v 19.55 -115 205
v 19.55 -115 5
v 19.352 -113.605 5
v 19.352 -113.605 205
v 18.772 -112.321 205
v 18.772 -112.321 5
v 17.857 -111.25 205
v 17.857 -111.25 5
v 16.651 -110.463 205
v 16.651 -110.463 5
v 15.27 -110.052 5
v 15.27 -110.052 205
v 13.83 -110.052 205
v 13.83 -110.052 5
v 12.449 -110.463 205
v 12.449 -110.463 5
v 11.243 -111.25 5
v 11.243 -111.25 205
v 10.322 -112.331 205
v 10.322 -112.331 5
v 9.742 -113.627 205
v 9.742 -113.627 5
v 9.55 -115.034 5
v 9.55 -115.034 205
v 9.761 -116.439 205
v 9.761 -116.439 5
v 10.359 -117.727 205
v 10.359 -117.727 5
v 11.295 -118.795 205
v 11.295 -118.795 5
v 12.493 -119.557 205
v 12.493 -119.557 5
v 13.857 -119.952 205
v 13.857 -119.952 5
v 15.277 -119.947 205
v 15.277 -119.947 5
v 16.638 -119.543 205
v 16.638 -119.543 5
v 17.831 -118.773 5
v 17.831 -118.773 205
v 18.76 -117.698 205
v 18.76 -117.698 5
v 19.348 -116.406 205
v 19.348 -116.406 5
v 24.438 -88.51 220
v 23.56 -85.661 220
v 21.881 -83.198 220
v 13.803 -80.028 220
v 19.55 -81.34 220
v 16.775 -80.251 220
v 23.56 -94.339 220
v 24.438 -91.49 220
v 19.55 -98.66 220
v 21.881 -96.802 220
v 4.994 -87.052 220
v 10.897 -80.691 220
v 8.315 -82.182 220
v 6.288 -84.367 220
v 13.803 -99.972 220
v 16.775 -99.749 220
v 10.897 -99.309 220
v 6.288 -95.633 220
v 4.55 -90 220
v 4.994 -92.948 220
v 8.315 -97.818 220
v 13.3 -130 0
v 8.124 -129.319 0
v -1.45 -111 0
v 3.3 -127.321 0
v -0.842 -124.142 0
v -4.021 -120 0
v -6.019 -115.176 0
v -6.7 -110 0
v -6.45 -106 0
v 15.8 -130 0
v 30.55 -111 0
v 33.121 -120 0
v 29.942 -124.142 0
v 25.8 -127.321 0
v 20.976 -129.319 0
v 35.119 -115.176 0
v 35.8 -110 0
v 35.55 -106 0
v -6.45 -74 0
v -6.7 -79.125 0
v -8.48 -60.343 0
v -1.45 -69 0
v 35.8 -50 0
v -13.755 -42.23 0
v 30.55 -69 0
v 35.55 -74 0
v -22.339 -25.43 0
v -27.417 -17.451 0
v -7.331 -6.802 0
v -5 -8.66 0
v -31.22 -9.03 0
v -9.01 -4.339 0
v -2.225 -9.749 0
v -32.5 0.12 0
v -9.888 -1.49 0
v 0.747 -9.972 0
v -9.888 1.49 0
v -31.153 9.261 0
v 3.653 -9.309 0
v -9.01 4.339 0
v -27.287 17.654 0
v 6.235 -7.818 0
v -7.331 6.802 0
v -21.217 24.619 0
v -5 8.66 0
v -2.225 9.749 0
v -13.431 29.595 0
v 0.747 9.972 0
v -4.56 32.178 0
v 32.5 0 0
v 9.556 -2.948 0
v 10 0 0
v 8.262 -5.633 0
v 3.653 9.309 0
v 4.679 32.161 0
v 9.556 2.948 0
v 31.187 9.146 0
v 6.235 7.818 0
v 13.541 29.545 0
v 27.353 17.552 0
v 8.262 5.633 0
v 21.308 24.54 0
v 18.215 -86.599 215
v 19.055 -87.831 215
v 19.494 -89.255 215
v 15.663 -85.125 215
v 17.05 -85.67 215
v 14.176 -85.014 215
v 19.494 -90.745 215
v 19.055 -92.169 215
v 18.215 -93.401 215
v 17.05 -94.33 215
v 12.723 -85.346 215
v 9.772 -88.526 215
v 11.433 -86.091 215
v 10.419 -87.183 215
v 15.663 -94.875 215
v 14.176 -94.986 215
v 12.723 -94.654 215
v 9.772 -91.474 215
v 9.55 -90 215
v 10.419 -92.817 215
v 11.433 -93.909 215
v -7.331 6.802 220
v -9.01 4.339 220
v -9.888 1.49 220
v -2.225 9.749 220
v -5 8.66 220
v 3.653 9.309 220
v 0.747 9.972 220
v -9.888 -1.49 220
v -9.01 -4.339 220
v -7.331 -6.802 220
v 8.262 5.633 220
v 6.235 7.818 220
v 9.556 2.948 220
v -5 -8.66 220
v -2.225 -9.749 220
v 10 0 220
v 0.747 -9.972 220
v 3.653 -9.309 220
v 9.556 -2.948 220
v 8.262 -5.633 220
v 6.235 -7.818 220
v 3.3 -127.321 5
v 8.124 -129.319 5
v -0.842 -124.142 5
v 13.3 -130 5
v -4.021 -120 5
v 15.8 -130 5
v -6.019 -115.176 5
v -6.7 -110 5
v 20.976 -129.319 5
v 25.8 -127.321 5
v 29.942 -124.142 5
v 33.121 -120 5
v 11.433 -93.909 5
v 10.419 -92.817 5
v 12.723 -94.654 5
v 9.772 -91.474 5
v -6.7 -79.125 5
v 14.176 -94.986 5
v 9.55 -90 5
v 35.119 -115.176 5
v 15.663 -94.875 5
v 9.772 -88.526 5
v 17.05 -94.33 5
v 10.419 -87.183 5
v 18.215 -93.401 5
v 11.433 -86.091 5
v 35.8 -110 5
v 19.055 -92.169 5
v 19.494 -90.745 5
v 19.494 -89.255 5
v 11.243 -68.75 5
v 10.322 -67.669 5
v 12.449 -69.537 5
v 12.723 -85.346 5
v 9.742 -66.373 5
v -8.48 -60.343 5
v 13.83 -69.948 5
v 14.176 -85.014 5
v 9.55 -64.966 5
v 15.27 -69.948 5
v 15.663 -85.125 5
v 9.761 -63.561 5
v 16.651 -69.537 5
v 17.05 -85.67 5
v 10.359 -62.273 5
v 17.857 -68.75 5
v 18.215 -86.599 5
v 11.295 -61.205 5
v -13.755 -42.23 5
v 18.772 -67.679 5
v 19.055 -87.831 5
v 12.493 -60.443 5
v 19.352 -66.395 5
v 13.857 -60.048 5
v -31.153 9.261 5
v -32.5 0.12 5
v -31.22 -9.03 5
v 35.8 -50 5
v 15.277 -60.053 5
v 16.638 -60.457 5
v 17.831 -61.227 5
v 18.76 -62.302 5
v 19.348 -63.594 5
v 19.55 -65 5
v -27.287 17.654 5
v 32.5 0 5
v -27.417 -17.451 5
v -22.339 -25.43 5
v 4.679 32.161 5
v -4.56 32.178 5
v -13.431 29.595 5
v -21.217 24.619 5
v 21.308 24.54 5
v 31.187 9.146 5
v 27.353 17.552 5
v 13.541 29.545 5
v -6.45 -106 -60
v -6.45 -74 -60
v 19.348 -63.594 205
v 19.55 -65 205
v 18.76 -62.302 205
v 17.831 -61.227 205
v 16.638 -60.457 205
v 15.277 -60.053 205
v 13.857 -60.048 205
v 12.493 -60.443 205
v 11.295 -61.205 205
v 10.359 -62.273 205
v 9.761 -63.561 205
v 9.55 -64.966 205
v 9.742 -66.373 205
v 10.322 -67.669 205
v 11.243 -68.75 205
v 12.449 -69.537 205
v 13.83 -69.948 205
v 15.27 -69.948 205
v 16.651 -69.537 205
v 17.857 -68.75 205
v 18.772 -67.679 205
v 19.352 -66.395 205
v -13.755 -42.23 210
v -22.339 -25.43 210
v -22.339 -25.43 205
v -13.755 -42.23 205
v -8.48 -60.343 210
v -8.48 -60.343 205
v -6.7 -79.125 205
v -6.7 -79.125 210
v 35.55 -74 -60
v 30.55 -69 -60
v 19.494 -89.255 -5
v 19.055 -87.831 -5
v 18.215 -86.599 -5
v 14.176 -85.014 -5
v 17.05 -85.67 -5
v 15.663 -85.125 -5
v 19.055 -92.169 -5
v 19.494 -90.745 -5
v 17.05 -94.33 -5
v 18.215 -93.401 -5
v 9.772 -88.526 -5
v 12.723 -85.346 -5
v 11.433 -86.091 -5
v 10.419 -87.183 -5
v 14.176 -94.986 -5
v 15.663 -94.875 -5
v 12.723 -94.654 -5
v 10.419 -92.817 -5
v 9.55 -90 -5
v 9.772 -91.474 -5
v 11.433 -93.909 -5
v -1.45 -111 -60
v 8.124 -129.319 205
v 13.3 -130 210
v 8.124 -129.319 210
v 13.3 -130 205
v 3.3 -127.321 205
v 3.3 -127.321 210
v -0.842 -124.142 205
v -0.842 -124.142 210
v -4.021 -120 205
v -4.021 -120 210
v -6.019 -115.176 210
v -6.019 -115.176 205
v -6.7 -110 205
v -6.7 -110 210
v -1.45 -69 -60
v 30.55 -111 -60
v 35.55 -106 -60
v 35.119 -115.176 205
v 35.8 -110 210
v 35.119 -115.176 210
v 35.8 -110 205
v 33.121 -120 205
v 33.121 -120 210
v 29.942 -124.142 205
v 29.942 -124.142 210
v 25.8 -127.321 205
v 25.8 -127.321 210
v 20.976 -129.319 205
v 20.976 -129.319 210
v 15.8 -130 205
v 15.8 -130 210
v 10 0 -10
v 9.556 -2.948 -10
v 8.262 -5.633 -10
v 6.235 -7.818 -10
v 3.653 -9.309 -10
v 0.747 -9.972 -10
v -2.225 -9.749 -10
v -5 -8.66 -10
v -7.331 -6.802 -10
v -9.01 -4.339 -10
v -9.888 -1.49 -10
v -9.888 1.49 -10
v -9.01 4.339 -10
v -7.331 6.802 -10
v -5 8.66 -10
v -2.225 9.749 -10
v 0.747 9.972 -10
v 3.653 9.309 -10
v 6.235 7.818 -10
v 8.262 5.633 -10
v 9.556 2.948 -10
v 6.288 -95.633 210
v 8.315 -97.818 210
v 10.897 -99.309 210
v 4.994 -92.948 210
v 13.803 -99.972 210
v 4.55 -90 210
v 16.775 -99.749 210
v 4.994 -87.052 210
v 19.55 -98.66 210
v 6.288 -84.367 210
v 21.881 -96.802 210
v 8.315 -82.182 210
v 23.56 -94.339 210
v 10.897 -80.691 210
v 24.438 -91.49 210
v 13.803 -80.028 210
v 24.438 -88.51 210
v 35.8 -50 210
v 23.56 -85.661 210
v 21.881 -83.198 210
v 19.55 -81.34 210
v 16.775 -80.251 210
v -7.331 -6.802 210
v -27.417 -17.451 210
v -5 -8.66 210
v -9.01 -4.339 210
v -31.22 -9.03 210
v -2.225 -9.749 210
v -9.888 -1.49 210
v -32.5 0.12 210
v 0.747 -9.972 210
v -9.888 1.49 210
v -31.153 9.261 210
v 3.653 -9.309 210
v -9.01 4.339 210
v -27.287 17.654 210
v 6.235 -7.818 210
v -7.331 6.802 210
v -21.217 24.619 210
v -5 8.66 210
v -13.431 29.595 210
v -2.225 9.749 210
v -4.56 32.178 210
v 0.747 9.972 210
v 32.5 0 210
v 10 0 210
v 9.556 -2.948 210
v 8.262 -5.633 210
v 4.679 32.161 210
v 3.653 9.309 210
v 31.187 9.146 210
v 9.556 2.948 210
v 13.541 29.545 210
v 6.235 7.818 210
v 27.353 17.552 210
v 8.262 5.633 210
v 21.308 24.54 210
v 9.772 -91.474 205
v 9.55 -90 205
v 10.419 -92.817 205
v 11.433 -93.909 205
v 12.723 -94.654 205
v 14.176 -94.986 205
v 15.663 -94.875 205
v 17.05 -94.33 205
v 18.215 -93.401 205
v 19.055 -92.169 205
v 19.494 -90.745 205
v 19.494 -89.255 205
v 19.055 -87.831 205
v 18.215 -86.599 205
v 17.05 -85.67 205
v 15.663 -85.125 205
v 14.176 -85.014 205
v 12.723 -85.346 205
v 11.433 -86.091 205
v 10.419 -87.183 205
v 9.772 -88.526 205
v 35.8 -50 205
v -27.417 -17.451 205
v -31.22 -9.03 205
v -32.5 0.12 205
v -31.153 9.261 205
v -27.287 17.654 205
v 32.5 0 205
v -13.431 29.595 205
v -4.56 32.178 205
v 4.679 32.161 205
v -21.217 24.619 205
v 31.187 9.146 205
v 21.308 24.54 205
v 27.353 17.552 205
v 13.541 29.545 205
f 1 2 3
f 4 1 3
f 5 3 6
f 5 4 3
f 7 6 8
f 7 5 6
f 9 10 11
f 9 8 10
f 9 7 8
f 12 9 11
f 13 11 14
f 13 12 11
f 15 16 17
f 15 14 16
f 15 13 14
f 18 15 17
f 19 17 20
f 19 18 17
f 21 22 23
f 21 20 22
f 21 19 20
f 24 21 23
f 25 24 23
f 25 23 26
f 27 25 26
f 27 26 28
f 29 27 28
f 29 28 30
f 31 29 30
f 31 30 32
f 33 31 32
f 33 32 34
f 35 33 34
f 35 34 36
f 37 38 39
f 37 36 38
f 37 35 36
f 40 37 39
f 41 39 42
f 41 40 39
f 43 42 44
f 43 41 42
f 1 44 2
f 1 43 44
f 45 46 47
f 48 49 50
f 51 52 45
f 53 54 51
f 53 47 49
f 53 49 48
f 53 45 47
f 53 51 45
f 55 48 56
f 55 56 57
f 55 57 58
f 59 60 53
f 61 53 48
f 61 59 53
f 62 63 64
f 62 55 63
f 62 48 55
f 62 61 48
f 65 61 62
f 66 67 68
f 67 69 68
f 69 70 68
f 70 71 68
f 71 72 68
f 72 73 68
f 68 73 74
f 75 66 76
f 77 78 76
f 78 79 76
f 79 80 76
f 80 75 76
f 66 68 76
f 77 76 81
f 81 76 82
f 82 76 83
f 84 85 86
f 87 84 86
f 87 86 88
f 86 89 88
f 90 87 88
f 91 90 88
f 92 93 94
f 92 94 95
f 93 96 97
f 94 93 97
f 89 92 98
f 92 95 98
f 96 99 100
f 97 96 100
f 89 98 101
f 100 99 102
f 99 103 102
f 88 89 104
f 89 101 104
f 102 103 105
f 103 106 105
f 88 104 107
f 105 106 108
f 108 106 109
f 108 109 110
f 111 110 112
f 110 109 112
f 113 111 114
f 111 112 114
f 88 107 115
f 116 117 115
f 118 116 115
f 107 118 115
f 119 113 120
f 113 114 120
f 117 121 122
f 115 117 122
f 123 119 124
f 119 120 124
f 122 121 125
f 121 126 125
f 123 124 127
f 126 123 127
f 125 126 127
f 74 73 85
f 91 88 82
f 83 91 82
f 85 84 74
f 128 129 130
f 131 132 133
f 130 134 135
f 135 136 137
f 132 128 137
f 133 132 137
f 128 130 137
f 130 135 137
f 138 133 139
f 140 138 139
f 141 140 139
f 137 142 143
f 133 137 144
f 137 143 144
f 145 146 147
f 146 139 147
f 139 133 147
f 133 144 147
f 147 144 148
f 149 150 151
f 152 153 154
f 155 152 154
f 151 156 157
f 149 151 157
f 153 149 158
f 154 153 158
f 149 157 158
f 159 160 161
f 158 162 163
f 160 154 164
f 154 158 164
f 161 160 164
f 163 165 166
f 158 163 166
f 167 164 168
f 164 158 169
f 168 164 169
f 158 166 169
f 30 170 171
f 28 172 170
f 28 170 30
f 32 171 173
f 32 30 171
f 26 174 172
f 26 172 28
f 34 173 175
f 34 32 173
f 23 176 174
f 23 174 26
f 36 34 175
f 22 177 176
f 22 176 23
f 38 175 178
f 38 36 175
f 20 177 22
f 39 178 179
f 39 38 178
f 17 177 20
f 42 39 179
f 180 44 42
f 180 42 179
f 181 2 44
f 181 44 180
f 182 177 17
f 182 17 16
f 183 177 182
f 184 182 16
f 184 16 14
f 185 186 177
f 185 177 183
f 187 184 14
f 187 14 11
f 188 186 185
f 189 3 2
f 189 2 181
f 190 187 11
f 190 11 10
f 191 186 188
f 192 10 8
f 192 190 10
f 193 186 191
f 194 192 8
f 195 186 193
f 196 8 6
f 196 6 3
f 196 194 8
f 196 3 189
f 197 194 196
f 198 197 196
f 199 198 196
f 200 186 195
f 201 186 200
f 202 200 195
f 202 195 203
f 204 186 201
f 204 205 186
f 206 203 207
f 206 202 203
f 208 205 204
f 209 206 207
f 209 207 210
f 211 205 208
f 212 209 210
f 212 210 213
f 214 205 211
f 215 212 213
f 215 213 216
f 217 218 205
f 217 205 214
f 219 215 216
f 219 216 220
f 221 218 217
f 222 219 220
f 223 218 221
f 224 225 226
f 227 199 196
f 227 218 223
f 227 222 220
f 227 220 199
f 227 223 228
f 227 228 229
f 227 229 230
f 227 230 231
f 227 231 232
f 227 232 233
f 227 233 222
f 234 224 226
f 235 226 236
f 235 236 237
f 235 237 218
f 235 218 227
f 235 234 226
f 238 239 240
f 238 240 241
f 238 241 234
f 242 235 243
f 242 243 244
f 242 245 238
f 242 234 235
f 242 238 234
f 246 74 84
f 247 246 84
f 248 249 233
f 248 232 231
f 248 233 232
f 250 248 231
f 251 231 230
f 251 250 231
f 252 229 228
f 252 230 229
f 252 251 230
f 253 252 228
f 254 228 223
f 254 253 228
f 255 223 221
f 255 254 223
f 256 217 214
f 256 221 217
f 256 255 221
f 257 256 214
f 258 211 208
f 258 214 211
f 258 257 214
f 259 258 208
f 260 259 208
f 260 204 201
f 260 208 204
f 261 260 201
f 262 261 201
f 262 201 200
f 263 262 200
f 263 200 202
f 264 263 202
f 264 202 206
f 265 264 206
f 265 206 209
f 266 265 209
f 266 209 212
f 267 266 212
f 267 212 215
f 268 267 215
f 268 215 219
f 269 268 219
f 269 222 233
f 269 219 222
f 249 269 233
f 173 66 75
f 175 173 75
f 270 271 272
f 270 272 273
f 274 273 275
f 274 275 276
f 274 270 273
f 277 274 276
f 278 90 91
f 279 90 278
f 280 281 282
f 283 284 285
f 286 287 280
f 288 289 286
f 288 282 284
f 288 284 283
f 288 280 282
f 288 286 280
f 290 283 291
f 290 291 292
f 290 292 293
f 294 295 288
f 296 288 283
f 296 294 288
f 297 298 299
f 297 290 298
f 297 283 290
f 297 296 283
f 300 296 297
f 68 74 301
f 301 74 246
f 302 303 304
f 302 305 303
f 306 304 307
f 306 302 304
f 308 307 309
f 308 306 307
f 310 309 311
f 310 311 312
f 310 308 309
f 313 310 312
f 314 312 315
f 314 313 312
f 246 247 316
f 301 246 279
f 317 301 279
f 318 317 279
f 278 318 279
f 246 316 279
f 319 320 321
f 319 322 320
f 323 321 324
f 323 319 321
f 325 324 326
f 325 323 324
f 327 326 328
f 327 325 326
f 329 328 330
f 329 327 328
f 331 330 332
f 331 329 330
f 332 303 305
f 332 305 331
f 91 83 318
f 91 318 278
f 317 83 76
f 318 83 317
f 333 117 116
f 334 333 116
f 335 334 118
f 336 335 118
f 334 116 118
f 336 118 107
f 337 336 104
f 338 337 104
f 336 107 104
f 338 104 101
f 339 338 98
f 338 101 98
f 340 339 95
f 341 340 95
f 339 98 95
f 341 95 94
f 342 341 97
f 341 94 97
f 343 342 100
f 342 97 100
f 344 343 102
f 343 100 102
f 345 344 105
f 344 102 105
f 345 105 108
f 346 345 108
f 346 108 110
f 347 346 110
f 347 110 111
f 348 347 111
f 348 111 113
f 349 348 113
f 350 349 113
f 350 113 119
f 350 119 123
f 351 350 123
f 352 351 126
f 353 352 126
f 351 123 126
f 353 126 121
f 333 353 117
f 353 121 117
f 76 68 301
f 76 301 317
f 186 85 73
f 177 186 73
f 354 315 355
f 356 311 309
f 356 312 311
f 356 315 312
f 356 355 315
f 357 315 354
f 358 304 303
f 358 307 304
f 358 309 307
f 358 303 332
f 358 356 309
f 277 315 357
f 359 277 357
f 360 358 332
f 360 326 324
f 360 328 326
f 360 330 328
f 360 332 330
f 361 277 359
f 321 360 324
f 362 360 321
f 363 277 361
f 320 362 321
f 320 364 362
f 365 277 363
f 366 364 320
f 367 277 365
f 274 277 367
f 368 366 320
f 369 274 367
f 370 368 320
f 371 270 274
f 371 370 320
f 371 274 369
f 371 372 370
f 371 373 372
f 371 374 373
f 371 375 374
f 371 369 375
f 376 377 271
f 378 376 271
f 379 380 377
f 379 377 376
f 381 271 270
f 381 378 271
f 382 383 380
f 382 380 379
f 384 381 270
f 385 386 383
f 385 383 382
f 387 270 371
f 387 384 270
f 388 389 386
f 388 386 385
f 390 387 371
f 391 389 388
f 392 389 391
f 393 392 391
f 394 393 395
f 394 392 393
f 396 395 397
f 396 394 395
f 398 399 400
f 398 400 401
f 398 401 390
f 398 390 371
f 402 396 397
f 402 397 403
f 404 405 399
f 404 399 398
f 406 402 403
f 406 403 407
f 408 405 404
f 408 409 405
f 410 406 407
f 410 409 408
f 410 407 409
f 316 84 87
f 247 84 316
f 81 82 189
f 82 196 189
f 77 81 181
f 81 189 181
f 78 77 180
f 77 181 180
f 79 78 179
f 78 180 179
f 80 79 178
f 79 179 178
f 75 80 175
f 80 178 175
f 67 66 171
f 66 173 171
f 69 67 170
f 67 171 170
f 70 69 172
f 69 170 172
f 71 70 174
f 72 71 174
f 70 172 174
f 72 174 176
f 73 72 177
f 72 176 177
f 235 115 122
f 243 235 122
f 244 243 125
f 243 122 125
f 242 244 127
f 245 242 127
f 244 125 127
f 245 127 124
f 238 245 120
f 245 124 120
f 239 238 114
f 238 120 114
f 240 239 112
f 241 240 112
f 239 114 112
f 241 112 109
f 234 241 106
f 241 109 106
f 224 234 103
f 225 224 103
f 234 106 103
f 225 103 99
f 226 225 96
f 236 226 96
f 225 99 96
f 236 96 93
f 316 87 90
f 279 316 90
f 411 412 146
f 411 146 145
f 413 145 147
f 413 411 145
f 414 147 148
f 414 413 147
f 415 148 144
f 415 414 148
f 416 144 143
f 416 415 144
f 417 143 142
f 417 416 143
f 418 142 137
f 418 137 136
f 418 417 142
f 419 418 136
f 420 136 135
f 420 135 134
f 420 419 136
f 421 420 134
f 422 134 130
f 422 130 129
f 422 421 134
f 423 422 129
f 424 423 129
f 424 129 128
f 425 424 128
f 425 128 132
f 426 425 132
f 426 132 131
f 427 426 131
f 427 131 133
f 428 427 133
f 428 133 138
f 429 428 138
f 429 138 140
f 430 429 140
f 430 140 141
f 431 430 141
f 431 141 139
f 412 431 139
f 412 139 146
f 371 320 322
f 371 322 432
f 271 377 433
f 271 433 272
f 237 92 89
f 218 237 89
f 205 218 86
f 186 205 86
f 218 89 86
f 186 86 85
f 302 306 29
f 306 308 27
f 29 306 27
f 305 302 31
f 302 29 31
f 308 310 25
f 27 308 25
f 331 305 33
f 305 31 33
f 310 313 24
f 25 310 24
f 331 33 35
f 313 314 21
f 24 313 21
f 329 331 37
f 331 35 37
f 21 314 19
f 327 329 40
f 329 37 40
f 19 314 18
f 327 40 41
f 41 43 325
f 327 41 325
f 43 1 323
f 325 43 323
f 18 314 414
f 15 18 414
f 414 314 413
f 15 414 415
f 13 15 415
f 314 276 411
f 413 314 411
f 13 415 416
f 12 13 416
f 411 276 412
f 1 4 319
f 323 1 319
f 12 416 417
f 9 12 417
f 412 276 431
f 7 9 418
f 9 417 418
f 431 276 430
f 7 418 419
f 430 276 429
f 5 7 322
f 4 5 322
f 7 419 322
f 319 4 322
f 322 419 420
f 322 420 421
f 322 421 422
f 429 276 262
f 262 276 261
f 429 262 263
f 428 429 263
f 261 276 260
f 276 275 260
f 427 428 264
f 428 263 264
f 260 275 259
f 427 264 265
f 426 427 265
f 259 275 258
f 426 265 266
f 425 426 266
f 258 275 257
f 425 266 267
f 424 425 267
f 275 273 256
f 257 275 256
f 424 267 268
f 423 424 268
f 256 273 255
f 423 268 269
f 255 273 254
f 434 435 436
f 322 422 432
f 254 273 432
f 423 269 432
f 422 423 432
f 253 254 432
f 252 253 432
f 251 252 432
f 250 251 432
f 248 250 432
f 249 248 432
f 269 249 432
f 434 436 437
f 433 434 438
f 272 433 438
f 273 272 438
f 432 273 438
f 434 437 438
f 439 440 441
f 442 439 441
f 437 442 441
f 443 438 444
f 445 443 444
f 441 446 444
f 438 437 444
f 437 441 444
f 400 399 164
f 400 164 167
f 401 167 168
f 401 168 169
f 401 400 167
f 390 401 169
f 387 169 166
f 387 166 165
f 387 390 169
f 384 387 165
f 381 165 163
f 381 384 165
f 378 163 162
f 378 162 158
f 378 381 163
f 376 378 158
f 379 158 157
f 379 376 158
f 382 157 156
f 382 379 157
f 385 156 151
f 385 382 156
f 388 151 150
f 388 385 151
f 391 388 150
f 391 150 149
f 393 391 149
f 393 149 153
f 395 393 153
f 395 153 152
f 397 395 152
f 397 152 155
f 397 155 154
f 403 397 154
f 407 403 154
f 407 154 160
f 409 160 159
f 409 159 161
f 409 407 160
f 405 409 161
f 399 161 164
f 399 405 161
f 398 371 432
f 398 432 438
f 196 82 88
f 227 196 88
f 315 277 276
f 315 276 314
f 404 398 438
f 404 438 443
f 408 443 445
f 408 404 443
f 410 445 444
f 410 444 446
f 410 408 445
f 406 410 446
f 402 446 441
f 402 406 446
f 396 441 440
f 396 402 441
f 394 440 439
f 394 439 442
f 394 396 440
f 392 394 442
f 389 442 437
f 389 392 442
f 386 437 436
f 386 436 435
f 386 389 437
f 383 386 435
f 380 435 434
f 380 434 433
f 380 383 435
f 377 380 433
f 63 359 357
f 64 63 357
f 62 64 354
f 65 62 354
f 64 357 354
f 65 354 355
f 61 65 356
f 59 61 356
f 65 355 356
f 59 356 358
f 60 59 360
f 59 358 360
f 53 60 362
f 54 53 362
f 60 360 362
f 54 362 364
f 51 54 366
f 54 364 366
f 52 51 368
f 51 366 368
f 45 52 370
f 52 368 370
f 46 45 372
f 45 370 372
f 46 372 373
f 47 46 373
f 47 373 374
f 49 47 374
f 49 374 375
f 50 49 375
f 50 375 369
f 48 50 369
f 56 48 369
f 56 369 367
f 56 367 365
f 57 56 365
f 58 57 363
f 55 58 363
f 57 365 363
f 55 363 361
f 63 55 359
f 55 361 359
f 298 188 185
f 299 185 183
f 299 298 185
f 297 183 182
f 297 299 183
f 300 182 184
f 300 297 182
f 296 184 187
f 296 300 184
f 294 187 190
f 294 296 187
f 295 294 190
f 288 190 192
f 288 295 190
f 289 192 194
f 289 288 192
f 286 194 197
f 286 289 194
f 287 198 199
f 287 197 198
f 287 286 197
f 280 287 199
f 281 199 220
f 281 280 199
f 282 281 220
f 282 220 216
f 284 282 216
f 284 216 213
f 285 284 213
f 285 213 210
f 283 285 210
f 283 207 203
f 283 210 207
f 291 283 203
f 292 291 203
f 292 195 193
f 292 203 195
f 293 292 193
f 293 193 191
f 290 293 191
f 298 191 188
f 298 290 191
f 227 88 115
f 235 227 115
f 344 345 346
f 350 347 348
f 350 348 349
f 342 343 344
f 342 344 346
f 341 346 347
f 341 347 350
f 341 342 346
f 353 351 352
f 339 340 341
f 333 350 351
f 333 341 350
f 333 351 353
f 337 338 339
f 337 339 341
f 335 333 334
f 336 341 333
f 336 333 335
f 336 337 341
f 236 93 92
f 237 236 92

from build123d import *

# Parameters (mm, degrees)
BOSS_EXTRUDE4_DEPTH     = 5
SKETCH5_3_R             = 5
BOSS_EXTRUDE5_DEPTH     = 105
FILLET3_R               = 20
SKETCH9_R               = 10
BOSS_EXTRUDE8_DEPTH     = 10
SKETCH5_4_W             = 42
SKETCH5_4_H             = 42
BOSS_EXTRUDE6_DEPTH     = 60
CHAMFER1_SIZE           = 5
SKETCH7_R               = 10
BOSS_EXTRUDE7_DEPTH     = 10
CUT_EXTRUDE2_DEPTH      = 210
CUT_EXTRUDE2_DEPTH_BACK = 10
SKETCH8_R               = 5


with BuildPart() as part:
    # Sketch5 → Boss-Extrude4 (new body)
    with BuildSketch(Plane.XY):
        with BuildLine():
            ThreePointArc((-22.338990751, -25.429636041), (-10.689321102, -51.161900175), (-6.7, -79.125260802))
            Line((-6.7, -79.125260802), (-6.7, -130))
            Line((-6.7, -130), (35.8, -130))
            Line((35.8, -130), (35.8, -50))
            Line((35.8, -50), (32.5, 0))
            ThreePointArc((32.5, 0), (-9.088092204, 31.203470642), (-27.417328006, -17.451078047))
            Line((-27.417328006, -17.451078047), (-22.338990751, -25.429636041))
        make_face()
        with BuildLine():
            ThreePointArc((11.55, -111), (14.55, -110), (17.55, -111))
            Line((17.55, -111), (11.55, -111))
        make_face(mode=Mode.SUBTRACT)
        with BuildLine():
            ThreePointArc((17.857189139, -111.25), (14.55, -120), (11.242810861, -111.25))
            Line((11.242810861, -111.25), (17.857189139, -111.25))
        make_face(mode=Mode.SUBTRACT)
        with BuildLine():
            Line((11.55, -69), (17.55, -69))
            ThreePointArc((17.55, -69), (14.55, -70), (11.55, -69))
        make_face(mode=Mode.SUBTRACT)
        with BuildLine():
            Line((17.857189139, -68.75), (11.242810861, -68.75))
            ThreePointArc((11.242810861, -68.75), (14.55, -60), (17.857189139, -68.75))
        make_face(mode=Mode.SUBTRACT)
    extrude(amount=BOSS_EXTRUDE4_DEPTH)

    # Sketch5<3> → Boss-Extrude5 (add)
    with BuildSketch(Plane.XY):
        with Locations((14.55, -65)):
            Circle(SKETCH5_3_R)
        with Locations((14.55, -115)):
            Circle(SKETCH5_3_R)
    extrude(amount=BOSS_EXTRUDE5_DEPTH)

    # Fillet3
    fillet3_edges = [part.edges().sort_by_distance(p)[0] for p in [
        (35.8, -130, 2.5),
        (-6.7, -130, 2.5),
    ]]
    fillet(fillet3_edges, radius=FILLET3_R)

    # Sketch9 → Boss-Extrude8 (add)
    with BuildSketch(Plane(origin=(0, 0, 0), x_dir=(-1, 0, 0), z_dir=(0, 0, -1))):
        with Locations(Location((0, 0, 0), (0, 0, 180))):
            Circle(SKETCH9_R)
    extrude(amount=BOSS_EXTRUDE8_DEPTH)

    # Mirror3: part across plane


with BuildPart() as part_1:
    add(part.part)
    add(part.part.mirror(Plane(origin=(14.55, -65, 105), x_dir=(1, 0, 0), z_dir=(0, 0, 1))))

    # Sketch5<4> → Boss-Extrude6 (add)
    with BuildSketch(Plane.XY):
        with Locations((14.55, -90)):
            Rectangle(SKETCH5_4_W, SKETCH5_4_H)
    extrude(amount=-BOSS_EXTRUDE6_DEPTH)

    # Chamfer1
    chamfer1_edges = [part_1.edges().sort_by_distance(p)[0] for p in [
        (-6.45, -111, -30),
        (-6.45, -69, -30),
        (35.55, -69, -30),
        (35.55, -111, -30),
    ]]
    chamfer(chamfer1_edges, length=CHAMFER1_SIZE)

    # Sketch7 → Boss-Extrude7 (add)
    with BuildSketch(Plane.XY.offset(210)):
        with Locations(Location((14.55, -90, 0), (0, 0, 180))):
            Circle(SKETCH7_R)
    extrude(amount=BOSS_EXTRUDE7_DEPTH)

    # Sketch8 → Cut-Extrude2 (cut, two sides: drawn at the far end of the back side and taken through both)
    with BuildSketch(Plane.XY.offset(5).offset(-CUT_EXTRUDE2_DEPTH_BACK)):
        with Locations(Location((14.55, -90, 0), (0, 0, 180))):
            Circle(SKETCH8_R)
    extrude(amount=CUT_EXTRUDE2_DEPTH + CUT_EXTRUDE2_DEPTH_BACK, mode=Mode.SUBTRACT)


solid = part_1.part
